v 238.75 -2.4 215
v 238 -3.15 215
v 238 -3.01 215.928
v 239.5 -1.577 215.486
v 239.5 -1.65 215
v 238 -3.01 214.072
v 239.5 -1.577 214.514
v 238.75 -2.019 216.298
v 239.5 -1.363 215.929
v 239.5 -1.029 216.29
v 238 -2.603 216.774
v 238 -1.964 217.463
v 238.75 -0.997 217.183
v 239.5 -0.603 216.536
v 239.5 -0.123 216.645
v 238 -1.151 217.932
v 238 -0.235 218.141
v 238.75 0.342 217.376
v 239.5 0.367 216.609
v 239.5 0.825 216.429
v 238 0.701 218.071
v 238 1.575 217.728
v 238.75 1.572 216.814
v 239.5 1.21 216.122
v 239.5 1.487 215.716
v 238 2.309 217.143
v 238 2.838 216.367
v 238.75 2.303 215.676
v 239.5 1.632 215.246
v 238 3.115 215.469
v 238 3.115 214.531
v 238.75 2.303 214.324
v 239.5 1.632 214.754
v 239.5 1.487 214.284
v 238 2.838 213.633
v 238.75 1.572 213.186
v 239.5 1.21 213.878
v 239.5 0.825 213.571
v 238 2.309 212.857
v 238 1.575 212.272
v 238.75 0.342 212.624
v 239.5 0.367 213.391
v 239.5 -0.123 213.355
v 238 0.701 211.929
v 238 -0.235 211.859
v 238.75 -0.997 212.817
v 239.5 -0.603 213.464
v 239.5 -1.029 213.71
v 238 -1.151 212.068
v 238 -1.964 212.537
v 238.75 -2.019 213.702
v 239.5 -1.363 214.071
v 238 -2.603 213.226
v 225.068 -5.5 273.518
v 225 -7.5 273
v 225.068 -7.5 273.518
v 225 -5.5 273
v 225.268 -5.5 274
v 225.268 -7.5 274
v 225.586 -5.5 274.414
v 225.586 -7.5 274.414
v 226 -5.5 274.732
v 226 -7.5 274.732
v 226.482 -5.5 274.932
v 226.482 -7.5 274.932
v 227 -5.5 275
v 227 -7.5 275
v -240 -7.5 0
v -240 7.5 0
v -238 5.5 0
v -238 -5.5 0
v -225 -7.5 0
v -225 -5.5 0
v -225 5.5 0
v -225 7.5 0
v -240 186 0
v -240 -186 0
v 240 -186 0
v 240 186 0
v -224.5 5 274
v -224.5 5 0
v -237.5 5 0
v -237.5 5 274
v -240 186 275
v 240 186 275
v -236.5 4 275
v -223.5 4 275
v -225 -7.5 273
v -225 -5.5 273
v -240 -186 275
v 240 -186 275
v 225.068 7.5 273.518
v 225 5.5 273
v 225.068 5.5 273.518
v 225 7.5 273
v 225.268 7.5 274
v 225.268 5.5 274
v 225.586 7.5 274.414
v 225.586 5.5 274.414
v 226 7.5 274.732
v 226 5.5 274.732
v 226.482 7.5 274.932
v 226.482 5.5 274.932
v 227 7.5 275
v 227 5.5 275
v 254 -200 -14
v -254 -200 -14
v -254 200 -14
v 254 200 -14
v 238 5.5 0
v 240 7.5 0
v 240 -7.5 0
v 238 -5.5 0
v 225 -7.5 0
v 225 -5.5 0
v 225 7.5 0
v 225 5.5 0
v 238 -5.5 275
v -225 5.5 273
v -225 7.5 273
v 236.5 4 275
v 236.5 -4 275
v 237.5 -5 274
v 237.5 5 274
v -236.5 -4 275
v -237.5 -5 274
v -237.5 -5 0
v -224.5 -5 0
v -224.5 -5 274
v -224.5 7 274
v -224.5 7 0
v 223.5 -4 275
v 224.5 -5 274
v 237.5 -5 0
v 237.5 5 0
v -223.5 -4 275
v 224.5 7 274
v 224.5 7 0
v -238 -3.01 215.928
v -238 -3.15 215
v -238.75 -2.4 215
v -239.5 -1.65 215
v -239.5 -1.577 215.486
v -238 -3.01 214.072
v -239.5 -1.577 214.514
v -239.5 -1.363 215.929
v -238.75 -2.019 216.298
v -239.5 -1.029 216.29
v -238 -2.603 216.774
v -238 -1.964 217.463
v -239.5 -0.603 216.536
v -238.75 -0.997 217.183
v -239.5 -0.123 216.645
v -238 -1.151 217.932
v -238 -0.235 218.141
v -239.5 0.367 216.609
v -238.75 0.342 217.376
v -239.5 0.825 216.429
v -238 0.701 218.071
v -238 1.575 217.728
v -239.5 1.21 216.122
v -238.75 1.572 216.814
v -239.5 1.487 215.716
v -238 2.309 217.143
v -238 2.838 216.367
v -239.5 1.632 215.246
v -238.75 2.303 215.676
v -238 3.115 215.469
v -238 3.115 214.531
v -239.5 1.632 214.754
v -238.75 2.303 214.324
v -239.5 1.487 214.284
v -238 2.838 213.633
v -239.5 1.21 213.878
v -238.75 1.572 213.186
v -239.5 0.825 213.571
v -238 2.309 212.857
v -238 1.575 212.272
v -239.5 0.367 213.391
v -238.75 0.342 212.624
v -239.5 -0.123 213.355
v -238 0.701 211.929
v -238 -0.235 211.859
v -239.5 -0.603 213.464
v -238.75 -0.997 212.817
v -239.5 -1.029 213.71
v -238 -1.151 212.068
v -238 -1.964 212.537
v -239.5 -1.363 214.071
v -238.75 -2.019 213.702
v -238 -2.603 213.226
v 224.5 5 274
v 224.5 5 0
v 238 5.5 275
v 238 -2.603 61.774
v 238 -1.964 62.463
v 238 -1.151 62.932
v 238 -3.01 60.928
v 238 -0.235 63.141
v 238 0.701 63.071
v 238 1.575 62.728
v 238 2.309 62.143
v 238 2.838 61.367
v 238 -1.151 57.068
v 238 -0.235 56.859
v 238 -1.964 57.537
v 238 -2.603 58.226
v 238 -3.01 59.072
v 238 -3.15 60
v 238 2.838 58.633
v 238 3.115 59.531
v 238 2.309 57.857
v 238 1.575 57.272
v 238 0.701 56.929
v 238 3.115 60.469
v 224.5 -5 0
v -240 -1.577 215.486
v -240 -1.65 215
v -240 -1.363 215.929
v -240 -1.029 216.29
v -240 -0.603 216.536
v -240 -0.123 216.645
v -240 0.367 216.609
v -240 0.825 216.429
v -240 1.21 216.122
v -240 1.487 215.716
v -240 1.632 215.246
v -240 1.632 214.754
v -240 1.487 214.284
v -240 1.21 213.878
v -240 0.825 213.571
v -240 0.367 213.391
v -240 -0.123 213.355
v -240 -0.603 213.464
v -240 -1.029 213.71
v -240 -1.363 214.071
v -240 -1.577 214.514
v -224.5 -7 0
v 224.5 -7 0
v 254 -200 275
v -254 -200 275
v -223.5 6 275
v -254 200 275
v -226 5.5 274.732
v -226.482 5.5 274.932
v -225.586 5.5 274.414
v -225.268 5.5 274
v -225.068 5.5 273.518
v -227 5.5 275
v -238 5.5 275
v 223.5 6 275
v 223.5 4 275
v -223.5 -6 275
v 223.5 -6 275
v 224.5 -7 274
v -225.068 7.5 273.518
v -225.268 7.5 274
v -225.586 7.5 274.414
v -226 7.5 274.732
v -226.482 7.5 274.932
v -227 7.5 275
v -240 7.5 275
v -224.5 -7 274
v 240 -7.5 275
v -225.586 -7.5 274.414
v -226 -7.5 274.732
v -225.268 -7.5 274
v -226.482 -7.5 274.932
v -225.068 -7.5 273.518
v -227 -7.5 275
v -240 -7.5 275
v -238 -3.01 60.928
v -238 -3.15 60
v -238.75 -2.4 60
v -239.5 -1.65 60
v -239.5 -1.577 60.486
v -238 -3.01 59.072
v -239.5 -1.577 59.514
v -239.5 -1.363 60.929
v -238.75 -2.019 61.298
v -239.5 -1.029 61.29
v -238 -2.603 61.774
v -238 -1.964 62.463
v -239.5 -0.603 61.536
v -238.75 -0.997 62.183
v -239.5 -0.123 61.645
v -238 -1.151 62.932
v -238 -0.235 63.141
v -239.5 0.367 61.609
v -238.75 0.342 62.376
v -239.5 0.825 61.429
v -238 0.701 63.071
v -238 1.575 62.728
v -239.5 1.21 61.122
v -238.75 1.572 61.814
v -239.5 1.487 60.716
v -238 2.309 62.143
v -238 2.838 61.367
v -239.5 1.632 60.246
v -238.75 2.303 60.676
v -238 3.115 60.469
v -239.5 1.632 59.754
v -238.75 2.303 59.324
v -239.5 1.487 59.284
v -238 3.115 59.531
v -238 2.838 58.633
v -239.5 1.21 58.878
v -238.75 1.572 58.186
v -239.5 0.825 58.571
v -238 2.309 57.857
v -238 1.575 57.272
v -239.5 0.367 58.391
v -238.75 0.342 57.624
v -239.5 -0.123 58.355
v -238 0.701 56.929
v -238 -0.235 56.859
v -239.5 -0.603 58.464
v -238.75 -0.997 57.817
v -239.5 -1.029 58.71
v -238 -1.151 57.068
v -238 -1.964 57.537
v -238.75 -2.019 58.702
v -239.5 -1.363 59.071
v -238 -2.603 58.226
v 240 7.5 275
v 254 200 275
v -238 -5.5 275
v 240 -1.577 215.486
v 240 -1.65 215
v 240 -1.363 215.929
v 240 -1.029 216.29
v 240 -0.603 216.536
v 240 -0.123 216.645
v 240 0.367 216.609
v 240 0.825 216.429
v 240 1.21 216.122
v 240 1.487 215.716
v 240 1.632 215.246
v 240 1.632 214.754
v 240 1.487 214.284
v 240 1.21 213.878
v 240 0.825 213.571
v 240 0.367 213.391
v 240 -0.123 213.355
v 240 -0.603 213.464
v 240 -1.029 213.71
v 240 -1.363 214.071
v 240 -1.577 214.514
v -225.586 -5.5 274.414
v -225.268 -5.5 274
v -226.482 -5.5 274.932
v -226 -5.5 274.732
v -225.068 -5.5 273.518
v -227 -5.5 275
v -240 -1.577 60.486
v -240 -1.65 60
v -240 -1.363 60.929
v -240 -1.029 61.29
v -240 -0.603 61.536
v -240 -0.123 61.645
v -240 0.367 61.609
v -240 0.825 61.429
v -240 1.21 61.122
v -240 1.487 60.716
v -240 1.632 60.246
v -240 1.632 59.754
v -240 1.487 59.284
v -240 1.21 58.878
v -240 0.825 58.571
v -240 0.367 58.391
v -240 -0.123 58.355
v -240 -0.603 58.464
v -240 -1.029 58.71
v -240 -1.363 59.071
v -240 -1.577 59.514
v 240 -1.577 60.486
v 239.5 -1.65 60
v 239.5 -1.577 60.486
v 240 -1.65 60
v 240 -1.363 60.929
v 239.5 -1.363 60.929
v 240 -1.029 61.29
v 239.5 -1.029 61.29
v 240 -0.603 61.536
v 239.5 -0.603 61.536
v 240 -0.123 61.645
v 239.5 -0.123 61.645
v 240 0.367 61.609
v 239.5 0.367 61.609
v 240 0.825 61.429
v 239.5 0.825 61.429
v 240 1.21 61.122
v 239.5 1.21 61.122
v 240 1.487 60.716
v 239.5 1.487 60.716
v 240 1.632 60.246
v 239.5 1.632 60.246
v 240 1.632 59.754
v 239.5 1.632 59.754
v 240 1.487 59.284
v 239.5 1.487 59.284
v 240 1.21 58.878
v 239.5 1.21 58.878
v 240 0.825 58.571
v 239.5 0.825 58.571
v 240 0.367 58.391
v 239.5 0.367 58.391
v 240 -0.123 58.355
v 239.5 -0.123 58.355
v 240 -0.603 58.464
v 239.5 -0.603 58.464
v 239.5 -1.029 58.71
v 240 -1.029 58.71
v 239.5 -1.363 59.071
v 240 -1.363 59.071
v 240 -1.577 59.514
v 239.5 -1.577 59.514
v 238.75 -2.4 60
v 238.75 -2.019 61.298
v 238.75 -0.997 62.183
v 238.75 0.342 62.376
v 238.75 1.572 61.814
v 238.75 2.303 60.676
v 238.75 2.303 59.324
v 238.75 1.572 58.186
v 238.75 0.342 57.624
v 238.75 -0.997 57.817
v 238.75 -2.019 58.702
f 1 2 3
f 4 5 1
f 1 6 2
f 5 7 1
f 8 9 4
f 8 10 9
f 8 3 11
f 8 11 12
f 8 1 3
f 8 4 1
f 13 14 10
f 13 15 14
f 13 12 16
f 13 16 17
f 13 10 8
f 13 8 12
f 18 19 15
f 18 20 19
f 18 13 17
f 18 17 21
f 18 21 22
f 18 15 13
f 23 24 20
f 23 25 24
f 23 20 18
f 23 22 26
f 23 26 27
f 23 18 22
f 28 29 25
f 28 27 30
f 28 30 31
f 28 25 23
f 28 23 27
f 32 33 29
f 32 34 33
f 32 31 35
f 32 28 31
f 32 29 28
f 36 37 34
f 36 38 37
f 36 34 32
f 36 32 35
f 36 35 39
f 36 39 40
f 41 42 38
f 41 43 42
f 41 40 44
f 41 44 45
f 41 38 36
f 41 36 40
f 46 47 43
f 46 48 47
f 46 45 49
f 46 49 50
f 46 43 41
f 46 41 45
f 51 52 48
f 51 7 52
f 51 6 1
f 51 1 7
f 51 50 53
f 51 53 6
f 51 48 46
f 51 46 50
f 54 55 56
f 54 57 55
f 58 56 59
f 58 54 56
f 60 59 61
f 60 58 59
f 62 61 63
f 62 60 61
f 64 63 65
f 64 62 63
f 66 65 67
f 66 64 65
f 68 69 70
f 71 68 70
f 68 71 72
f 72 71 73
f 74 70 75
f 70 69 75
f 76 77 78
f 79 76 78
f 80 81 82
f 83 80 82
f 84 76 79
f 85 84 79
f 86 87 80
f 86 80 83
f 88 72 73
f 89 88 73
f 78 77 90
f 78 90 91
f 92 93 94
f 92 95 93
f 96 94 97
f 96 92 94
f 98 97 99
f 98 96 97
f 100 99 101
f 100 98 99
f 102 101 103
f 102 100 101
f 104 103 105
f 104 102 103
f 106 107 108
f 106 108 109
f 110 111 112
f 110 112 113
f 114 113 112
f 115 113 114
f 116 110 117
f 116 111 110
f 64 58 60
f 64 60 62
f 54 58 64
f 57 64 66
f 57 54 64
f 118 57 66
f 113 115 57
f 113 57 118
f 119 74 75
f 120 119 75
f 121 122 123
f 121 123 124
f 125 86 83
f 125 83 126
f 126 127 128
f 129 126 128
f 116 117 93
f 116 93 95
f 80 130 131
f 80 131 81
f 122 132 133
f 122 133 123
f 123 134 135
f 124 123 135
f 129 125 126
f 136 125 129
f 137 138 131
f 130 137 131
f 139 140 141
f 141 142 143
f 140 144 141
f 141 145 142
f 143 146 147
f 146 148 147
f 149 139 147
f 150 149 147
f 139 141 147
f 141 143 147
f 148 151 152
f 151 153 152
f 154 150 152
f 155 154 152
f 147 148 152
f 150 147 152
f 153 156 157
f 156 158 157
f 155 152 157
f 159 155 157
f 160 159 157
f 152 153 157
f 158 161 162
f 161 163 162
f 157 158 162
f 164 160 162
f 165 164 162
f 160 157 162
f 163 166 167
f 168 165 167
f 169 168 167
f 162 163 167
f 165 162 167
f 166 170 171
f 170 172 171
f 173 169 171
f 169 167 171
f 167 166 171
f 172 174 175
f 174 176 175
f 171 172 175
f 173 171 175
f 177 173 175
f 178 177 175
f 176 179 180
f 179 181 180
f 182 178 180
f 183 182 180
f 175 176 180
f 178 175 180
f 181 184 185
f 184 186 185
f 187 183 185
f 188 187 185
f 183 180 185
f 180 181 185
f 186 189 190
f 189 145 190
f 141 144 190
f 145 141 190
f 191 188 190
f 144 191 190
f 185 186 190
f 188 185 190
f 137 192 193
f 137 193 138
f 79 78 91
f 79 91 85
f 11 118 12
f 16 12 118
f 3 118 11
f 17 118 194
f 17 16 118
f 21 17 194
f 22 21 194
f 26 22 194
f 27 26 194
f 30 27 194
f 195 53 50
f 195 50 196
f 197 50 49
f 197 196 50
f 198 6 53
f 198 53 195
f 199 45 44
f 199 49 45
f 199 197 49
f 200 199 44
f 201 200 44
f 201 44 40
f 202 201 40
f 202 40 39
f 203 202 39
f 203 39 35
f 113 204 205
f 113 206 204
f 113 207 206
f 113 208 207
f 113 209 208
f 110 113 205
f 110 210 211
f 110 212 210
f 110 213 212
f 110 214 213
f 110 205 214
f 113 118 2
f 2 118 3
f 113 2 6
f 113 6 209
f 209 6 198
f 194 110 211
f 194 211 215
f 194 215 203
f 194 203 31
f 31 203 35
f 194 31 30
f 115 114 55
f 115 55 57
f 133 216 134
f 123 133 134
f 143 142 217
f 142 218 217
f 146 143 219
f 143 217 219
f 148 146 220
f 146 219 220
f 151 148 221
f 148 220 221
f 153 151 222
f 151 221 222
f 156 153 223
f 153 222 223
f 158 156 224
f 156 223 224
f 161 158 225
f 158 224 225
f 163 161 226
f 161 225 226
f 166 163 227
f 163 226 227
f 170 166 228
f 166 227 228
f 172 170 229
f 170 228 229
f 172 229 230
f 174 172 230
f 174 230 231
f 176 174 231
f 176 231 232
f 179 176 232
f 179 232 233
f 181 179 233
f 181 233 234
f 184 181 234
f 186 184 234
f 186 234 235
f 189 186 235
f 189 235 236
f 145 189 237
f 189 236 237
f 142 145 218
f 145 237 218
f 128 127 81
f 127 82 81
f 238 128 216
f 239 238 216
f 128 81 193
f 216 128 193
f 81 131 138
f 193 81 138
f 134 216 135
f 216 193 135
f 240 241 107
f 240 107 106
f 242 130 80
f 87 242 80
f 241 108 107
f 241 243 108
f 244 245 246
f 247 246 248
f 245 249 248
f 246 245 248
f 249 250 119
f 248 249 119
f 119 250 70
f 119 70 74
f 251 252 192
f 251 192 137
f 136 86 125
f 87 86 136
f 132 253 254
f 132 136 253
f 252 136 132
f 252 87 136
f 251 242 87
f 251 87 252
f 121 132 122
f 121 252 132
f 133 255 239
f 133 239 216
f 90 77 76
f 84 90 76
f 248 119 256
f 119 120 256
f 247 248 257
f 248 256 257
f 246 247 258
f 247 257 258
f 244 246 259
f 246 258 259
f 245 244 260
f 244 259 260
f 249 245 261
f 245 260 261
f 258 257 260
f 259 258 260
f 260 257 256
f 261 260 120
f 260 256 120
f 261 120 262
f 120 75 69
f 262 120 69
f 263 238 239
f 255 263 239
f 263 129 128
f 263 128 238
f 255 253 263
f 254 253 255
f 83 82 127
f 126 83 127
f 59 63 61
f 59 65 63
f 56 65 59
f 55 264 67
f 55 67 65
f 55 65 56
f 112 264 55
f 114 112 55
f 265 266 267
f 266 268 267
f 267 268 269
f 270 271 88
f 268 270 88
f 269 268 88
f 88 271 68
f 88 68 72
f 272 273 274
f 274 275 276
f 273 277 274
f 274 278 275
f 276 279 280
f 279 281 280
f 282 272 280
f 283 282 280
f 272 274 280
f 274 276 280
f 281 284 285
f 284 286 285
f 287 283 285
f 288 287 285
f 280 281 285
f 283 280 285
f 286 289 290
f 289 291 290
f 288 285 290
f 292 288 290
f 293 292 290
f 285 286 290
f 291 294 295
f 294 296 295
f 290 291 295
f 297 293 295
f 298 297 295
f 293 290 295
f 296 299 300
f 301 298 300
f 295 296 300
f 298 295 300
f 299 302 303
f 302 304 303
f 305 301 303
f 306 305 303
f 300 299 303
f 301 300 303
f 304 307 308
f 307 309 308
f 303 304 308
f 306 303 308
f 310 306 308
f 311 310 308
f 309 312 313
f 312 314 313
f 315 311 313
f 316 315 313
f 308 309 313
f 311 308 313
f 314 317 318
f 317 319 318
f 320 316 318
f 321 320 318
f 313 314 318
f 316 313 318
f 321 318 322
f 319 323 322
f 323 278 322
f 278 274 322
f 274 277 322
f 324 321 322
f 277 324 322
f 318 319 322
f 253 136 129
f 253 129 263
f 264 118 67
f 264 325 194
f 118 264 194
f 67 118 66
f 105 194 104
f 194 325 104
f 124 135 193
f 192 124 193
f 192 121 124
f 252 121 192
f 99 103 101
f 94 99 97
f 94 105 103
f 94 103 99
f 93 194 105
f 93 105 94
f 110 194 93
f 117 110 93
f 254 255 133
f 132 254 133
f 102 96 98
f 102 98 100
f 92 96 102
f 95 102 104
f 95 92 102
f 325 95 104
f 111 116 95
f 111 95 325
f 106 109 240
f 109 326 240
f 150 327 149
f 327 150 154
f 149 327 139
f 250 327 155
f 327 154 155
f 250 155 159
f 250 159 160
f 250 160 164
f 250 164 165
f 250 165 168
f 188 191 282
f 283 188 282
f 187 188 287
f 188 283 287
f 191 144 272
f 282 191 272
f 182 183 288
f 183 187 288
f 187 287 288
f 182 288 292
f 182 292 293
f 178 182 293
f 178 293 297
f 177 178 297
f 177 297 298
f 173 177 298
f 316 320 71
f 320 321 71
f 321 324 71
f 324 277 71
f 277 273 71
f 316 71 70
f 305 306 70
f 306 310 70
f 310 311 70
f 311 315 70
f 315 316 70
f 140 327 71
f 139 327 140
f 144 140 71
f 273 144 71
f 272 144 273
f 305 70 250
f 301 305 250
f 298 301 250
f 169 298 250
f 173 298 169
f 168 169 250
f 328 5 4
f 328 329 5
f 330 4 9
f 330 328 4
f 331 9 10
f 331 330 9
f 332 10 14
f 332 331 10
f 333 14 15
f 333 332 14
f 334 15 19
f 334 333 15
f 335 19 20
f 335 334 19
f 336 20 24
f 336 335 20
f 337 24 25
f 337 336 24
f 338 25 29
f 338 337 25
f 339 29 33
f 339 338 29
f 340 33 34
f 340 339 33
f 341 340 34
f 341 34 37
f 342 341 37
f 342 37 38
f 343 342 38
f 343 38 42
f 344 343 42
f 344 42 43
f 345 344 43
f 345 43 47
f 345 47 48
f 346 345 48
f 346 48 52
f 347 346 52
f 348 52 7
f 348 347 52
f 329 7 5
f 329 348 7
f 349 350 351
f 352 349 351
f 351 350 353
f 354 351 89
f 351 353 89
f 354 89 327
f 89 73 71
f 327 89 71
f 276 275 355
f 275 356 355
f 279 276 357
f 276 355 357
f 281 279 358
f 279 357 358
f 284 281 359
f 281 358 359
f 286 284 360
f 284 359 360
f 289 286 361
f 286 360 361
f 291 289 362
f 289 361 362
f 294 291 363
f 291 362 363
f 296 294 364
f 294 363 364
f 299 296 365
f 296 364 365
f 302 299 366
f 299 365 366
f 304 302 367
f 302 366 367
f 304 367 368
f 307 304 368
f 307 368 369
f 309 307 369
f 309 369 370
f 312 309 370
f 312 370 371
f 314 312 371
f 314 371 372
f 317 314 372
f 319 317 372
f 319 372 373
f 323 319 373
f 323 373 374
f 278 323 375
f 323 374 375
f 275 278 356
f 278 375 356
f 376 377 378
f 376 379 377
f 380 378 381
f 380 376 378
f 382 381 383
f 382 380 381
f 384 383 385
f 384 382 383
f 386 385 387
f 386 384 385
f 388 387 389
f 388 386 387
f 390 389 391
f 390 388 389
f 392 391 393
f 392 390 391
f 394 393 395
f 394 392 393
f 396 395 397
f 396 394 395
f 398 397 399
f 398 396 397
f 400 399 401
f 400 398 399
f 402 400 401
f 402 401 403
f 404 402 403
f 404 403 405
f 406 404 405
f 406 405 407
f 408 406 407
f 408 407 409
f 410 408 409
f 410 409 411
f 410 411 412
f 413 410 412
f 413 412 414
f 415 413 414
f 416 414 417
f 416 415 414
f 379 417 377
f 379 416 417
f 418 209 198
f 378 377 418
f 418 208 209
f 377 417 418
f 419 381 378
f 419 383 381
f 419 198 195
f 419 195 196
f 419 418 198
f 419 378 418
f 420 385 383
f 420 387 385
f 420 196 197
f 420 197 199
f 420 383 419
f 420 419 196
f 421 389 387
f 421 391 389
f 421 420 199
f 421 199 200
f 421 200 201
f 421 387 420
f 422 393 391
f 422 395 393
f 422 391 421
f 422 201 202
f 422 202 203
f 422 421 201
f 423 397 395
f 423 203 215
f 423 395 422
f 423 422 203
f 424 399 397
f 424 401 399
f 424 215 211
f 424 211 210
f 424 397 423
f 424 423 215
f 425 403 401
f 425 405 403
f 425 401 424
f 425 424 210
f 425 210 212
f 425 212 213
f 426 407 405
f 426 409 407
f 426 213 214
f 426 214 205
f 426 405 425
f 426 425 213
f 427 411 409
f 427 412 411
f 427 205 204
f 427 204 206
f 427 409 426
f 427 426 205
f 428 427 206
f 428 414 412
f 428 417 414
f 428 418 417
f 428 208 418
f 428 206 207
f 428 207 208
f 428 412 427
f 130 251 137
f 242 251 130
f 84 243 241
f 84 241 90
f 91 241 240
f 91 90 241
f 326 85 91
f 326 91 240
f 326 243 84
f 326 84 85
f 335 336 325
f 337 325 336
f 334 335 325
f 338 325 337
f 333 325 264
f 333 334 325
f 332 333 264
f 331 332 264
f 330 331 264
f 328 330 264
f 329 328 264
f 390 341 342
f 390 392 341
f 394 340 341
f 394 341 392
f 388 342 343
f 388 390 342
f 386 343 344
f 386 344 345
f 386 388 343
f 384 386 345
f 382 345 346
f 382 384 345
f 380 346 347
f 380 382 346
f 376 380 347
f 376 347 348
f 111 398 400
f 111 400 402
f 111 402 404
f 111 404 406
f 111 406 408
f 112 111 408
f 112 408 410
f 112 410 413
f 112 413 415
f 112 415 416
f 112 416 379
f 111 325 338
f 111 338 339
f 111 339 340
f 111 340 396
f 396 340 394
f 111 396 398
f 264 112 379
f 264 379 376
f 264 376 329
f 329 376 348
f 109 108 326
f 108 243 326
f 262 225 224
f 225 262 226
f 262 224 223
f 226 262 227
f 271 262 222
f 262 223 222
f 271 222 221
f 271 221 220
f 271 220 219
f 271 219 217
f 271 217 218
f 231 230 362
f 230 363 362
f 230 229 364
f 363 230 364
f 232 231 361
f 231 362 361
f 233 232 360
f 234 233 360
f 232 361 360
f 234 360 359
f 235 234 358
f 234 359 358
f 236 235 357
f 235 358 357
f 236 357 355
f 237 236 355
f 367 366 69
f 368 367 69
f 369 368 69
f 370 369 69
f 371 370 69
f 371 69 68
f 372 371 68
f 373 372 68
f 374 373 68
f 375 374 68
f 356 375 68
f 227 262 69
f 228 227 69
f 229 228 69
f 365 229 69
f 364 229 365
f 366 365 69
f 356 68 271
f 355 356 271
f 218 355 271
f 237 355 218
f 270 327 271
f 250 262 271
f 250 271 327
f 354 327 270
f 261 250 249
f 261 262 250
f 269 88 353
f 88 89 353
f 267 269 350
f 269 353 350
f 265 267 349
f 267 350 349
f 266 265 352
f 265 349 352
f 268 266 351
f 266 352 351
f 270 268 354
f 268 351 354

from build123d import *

# Parameters (mm, degrees)
F1_DEPTH       = 275
F2_R           = 2
F4_D           = 3.3
F4_CSINK_D     = 6.3
F4_CSINK_ANGLE = 90
F8_DEPTH       = 275
F9_SIZE        = 1
F6_W           = 508
F6_H           = 400
F6_W_2         = 480
F6_H_2         = 372
F10_DEPTH      = 275
F11_W          = 508
F11_H          = 400
F12_DEPTH      = 14


with BuildPart() as f1:
    # F0 (on Top) → F1 (new body)
    with BuildSketch(Plane.XY):
        Polygon((-240, 7.5), (-240, -7.5), (-225, -7.5), (-225, -5.5), (-238, -5.5), (-238, 5.5), (-225, 5.5), (-225, 7.5), align=None)
    extrude(amount=F1_DEPTH)

    # F2
    f2_edges = [f1.edges().sort_by_distance(p)[0] for p in [
        (-225, -6.5, 275),
        (-225, 6.5, 275),
    ]]
    fillet(f2_edges, radius=F2_R)

    # F4 (through all)
    with Locations(Plane.YZ.offset(-238)):
        with Locations((0, 215), (0, 60)):
            CounterSinkHole(F4_D / 2, F4_CSINK_D / 2, counter_sink_angle=F4_CSINK_ANGLE)


with BuildPart() as f5_1:
    # F5: instance of F1
    add(f1.part.mirror(Plane.YZ))


with BuildPart() as f8:
    # F7 (on face) → F8 (new body, through all)
    with BuildSketch(Plane.XY):
        Polygon((-237.5, -5), (-224.5, -5), (-224.5, -7), (224.5, -7), (224.5, -5), (237.5, -5), (237.5, 5), (224.5, 5), (224.5, 7), (-224.5, 7), (-224.5, 5), (-237.5, 5), align=None)
    extrude(amount=F8_DEPTH)

    # F9
    f9_edges = [f8.edges().sort_by_distance(p)[0] for p in [
        (0, -7, 275),
        (0, 7, 275),
        (-224.5, -6, 275),
        (-231, -5, 275),
        (-237.5, 0, 275),
        (-224.5, 6, 275),
        (-231, 5, 275),
        (224.5, 6, 275),
        (224.5, -6, 275),
        (231, -5, 275),
        (231, 5, 275),
        (237.5, 0, 275),
    ]]
    chamfer(f9_edges, length=F9_SIZE)


with BuildPart() as f10:
    # F6 (on Top) → F10 (new body, through all)
    with BuildSketch(Plane.XY):
        Rectangle(F6_W, F6_H)
        Rectangle(F6_W_2, F6_H_2, mode=Mode.SUBTRACT)
    extrude(amount=F10_DEPTH)

    # F11 (on face) → F12 (join)
    with BuildSketch(Plane(origin=(0, 0, 0), x_dir=(1, 0, 0), z_dir=(0, 0, -1))):
        Rectangle(F11_W, F11_H)
    extrude(amount=F12_DEPTH)


solid = Compound([f1.part, f5_1.part, f8.part, f10.part])
